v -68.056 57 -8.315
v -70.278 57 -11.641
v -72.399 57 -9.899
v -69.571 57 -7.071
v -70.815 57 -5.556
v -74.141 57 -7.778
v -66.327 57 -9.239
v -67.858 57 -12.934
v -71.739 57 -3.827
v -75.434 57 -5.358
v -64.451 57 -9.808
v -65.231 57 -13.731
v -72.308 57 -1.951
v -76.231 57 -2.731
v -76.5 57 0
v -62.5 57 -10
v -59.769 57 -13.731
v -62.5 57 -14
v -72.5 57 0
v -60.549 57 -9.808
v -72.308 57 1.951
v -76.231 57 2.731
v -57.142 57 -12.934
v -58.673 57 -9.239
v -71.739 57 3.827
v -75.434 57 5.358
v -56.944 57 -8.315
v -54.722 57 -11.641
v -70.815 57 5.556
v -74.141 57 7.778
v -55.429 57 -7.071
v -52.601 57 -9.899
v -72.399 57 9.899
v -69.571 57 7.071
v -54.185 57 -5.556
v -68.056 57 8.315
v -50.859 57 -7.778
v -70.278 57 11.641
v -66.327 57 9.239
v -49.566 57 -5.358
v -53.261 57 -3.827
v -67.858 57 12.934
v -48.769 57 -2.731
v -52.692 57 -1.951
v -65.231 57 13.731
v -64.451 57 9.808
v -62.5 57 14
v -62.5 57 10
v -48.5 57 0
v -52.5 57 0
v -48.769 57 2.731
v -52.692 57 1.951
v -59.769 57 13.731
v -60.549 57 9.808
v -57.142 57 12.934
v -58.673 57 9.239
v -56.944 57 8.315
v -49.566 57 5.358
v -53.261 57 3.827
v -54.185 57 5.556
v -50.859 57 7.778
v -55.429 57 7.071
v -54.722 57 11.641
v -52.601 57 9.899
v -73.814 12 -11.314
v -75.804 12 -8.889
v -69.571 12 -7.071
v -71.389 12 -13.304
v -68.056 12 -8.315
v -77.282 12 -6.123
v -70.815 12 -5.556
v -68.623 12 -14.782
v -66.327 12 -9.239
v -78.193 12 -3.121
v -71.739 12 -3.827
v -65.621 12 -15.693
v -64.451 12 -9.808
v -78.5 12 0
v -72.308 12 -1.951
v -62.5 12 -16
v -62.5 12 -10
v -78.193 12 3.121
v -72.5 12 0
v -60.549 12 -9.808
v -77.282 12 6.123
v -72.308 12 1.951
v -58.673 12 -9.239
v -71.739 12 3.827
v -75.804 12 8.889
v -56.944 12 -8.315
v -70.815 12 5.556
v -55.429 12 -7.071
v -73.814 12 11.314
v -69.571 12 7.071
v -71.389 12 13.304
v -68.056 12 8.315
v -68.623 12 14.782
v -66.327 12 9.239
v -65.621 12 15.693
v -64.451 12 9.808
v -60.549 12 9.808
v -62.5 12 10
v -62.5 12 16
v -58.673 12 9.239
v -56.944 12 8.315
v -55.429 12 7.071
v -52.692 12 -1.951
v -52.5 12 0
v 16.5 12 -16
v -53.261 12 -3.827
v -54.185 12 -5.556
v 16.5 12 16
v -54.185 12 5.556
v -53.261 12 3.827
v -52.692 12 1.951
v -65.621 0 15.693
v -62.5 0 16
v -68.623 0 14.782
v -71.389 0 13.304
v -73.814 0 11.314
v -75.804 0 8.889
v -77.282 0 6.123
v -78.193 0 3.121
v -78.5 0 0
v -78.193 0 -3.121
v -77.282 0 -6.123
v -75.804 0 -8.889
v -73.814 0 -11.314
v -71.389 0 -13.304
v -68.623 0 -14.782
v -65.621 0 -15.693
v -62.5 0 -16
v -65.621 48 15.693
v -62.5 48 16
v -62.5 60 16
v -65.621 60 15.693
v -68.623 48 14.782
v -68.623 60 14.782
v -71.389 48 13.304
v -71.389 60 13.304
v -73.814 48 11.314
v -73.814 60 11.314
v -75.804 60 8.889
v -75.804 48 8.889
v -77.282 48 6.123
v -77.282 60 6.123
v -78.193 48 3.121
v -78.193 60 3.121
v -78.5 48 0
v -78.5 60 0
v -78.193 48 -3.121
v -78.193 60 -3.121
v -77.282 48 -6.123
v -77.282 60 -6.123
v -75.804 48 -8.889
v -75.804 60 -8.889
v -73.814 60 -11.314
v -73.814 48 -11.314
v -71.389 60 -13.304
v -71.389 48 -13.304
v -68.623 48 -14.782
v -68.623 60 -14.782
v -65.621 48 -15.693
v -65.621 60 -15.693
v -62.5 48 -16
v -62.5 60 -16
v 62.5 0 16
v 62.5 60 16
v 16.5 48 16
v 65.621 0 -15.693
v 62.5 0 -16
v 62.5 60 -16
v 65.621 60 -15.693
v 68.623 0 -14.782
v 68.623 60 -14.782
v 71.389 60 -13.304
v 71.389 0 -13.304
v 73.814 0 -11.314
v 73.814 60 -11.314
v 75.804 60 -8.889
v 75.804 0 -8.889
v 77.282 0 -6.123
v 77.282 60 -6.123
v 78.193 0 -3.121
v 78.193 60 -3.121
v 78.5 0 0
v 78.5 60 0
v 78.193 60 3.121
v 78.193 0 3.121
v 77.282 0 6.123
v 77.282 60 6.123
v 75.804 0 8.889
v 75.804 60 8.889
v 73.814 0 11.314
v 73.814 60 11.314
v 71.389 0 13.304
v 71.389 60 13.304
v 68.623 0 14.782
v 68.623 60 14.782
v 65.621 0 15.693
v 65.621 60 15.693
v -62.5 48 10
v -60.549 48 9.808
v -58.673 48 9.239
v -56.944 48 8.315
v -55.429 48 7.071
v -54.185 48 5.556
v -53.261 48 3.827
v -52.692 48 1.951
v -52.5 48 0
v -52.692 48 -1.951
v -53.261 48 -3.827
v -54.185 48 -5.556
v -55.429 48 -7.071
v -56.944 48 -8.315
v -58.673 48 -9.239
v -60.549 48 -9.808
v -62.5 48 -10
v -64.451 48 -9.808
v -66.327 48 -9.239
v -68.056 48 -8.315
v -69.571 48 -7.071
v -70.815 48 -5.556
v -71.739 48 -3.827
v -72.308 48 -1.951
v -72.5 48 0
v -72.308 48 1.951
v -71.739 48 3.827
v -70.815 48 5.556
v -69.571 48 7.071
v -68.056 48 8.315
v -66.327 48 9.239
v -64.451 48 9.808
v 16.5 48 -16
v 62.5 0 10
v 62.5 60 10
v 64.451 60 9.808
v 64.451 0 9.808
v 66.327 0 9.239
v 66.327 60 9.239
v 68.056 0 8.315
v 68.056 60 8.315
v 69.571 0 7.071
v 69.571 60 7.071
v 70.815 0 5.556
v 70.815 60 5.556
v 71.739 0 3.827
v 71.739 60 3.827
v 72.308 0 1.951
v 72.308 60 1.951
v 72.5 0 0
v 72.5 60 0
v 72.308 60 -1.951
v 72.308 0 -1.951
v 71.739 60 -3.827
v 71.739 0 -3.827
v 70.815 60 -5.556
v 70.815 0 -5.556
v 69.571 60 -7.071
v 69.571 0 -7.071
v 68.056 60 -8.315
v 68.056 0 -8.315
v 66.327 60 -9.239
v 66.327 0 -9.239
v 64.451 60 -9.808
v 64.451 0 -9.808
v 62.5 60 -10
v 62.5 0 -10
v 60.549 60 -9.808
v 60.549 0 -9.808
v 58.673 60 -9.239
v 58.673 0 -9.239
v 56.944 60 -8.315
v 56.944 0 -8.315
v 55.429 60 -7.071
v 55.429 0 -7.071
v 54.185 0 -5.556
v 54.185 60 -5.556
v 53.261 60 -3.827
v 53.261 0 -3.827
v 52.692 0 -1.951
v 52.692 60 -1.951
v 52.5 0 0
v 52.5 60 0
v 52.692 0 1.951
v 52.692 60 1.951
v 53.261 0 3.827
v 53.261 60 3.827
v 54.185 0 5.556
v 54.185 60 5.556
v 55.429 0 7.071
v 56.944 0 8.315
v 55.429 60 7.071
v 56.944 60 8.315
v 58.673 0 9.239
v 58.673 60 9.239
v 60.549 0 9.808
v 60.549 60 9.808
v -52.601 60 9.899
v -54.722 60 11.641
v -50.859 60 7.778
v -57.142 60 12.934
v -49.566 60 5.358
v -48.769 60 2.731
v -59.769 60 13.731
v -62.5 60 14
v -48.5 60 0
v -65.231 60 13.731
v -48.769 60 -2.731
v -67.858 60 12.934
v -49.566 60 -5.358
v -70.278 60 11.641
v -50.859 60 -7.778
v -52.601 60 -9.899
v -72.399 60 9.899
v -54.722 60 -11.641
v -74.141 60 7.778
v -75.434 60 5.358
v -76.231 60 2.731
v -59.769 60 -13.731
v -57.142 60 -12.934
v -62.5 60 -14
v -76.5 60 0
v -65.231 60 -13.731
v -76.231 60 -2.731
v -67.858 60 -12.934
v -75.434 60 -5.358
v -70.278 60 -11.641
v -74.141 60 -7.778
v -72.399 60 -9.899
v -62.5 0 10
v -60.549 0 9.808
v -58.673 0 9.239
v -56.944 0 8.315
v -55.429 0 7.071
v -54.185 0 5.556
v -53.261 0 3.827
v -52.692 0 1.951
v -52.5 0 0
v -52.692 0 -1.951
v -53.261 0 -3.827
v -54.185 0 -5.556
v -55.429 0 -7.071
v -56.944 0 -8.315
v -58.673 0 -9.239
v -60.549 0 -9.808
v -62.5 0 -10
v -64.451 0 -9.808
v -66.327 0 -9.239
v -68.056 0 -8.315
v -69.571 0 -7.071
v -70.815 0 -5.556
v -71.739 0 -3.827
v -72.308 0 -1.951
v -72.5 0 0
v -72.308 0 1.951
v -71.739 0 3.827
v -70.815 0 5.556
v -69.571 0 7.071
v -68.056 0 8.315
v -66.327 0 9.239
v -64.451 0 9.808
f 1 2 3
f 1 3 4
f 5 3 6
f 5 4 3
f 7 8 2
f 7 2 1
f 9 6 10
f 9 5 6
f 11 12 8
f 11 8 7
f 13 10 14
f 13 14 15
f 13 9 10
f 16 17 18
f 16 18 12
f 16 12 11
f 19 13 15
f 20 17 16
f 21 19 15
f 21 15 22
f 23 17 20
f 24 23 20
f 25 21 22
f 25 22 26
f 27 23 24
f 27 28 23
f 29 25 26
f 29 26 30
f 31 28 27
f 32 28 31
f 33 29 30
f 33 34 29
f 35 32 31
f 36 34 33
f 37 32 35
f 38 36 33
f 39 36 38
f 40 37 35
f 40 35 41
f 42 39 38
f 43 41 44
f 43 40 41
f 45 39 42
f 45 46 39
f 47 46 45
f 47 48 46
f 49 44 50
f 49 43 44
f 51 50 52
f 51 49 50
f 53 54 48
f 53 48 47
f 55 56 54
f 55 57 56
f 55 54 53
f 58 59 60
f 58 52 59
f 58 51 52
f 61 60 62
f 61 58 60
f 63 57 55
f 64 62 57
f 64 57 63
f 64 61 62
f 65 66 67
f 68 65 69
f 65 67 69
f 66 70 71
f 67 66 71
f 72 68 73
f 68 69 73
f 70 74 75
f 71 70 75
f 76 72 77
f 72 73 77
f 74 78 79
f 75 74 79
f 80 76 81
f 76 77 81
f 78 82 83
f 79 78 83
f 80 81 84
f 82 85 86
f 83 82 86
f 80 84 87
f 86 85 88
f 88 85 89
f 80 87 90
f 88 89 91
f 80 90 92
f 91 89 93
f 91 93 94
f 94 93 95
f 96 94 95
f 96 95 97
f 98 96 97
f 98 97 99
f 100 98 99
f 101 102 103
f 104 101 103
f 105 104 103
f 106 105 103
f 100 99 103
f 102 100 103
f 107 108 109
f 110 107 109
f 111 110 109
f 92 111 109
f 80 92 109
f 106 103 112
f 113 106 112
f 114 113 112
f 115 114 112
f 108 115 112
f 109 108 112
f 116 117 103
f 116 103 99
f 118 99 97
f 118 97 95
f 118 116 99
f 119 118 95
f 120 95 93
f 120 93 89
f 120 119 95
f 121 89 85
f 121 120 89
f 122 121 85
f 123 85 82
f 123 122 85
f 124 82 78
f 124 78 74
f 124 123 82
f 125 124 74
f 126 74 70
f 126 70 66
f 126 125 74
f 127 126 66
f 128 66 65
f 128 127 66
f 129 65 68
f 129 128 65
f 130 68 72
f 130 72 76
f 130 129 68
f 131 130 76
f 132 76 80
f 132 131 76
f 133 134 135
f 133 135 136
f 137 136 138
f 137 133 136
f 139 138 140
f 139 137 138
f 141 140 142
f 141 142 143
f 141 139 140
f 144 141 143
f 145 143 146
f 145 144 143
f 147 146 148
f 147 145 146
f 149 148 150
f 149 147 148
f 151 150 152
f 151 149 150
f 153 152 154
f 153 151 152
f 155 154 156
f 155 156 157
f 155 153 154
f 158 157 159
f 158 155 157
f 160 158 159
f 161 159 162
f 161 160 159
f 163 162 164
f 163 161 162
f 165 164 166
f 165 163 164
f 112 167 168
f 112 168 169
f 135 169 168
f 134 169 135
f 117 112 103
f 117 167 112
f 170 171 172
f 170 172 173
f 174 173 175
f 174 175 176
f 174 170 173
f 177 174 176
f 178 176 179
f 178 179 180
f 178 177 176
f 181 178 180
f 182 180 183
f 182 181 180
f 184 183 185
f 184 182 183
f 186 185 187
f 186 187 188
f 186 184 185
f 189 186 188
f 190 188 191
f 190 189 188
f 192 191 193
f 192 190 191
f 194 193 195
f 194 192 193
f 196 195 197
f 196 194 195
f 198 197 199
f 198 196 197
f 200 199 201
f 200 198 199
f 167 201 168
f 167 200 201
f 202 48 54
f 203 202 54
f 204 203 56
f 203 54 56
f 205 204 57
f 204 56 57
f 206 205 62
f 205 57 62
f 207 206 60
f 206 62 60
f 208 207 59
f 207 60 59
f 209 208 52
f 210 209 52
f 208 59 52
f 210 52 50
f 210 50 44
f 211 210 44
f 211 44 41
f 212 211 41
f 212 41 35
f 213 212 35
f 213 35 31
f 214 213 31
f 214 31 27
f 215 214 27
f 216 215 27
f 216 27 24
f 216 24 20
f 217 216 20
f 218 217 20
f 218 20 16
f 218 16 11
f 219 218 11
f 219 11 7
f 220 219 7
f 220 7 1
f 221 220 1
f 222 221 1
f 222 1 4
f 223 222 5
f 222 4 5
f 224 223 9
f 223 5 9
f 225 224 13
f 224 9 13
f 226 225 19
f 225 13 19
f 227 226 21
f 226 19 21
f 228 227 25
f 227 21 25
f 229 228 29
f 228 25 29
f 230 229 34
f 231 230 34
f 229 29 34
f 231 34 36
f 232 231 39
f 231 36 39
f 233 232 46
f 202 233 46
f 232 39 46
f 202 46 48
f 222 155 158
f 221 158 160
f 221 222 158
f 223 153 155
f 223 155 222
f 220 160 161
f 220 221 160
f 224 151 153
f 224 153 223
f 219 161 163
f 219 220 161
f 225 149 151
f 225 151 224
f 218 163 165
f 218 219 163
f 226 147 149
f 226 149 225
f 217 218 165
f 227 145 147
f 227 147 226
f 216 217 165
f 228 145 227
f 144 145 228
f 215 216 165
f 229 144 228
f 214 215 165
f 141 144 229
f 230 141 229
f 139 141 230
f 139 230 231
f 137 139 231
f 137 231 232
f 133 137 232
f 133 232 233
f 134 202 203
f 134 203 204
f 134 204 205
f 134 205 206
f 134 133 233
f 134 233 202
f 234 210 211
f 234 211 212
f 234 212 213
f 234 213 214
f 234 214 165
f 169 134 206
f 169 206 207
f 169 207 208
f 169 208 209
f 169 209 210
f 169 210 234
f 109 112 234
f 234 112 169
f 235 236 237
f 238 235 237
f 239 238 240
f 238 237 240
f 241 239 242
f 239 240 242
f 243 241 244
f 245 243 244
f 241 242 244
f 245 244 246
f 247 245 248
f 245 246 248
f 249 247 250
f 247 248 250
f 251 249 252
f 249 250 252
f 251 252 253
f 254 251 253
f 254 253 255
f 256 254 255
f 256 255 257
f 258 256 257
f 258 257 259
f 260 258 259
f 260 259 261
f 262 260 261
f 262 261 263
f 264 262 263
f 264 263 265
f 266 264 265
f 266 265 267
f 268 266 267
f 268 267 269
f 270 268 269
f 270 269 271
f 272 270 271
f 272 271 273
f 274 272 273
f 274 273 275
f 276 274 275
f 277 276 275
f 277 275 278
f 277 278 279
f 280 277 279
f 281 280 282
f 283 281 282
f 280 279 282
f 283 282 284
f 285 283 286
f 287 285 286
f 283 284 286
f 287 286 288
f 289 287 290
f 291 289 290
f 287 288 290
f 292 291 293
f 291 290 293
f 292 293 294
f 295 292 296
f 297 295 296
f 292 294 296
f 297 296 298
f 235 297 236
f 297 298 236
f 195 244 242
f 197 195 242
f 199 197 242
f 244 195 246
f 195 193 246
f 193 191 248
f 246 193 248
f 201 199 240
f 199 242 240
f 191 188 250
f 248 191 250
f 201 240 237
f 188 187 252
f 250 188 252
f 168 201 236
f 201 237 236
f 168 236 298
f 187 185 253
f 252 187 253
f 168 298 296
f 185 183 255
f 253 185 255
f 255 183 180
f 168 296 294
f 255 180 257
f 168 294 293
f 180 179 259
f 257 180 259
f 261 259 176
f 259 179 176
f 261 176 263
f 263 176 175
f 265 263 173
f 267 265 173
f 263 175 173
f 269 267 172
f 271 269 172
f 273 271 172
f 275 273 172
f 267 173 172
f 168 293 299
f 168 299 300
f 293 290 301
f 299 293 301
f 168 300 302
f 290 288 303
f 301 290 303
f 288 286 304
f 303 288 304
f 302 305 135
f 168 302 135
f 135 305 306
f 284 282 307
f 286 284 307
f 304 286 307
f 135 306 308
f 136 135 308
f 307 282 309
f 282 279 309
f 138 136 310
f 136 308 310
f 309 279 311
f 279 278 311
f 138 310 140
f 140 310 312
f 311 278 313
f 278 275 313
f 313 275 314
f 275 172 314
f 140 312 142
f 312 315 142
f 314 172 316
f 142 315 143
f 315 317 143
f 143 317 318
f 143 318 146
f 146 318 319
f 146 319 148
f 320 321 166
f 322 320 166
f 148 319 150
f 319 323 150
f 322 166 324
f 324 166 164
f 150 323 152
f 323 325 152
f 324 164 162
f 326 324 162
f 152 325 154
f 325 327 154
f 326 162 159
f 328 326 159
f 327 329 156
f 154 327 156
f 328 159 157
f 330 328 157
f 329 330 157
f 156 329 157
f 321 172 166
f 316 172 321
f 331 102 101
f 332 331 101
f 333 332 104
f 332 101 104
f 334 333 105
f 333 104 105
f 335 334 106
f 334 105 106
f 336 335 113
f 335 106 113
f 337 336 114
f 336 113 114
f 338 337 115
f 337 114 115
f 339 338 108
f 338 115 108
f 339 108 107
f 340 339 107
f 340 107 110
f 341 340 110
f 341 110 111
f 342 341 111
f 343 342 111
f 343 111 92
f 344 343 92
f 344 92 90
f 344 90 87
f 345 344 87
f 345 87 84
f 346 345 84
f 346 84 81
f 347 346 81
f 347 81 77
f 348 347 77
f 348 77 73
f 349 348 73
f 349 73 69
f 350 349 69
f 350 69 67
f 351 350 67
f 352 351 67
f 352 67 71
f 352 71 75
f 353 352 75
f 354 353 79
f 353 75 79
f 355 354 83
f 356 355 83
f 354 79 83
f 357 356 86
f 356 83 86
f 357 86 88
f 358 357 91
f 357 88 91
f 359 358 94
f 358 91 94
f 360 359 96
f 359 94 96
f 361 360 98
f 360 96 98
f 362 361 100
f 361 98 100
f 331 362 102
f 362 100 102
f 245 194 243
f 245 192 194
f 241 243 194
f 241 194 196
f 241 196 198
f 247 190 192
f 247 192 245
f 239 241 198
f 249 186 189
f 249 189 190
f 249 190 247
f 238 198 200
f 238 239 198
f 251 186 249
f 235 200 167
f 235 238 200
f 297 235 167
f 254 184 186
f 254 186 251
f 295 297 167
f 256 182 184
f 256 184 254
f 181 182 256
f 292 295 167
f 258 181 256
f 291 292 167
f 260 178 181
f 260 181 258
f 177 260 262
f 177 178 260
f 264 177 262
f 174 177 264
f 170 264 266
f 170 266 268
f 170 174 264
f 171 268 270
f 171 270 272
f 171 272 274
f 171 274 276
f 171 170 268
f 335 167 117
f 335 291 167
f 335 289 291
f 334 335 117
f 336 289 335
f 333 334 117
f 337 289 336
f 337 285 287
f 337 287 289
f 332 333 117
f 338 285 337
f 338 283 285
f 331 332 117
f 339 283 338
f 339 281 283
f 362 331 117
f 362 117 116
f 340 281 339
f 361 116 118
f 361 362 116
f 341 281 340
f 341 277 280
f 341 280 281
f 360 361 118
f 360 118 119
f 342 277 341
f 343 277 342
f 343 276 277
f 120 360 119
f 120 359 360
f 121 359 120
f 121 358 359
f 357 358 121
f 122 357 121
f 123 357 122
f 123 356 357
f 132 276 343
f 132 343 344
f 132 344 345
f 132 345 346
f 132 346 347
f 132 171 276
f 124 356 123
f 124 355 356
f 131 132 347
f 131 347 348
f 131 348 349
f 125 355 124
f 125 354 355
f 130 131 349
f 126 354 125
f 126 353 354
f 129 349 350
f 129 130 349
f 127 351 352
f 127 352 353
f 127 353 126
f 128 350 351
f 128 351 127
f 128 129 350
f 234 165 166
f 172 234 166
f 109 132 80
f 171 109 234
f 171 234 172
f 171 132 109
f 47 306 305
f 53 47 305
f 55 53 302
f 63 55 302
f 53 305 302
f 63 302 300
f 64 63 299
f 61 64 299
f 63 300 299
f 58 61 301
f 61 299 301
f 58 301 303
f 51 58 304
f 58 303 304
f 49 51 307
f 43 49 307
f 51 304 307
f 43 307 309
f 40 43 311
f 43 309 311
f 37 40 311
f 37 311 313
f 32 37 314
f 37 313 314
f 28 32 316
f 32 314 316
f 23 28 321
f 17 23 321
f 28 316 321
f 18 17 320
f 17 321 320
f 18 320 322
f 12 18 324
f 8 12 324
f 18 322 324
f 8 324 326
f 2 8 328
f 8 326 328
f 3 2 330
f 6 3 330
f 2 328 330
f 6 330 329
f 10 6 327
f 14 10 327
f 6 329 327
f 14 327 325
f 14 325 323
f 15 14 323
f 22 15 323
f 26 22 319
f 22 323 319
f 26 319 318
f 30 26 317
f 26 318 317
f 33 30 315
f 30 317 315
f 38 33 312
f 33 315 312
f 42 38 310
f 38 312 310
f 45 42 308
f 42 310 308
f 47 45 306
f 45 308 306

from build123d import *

# Parameters (mm, degrees)
EXTRUDE_1_DEPTH     = 60
CUT_EXTRUDE_1_REACH = 102.091
SKETCH_2_R          = 10
CUT_EXTRUDE_2_REACH = 102.091
SKETCH_3_R          = 10
SKETCH_4_R          = 14
CUT_EXTRUDE_3_DEPTH = 3
CUT_EXTRUDE_4_REACH = 105.857
SKETCH_6_W          = 115
SKETCH_6_H          = 36


with BuildPart() as part:
    # 草图1 → 凸台-拉伸1 (new body)
    with BuildSketch(Plane(origin=(0, 0, 0), x_dir=(1, 0, 0), z_dir=(0, 1, 0))):
        with BuildLine():
            Line((-62.5, 16), (62.5, 16))
            ThreePointArc((62.5, 16), (78.5, 0), (62.5, -16))
            Line((62.5, -16), (-62.5, -16))
            ThreePointArc((-62.5, -16), (-78.5, 0), (-62.5, 16))
        make_face()
    extrude(amount=EXTRUDE_1_DEPTH)

    # 草图2 → 切除-拉伸1 (cut, up to next)
    with BuildSketch(Plane(origin=(0, 60, 0), x_dir=(1, 0, 0), z_dir=(0, 1, 0)), mode=Mode.PRIVATE) as cut_extrude_1_sk1:
        with Locations((62.5, 0)):
            Circle(SKETCH_2_R)
    cut_extrude_1_tool1 = extrude(cut_extrude_1_sk1.sketch, amount=-CUT_EXTRUDE_1_REACH, mode=Mode.PRIVATE) & part.part
    add(cut_extrude_1_tool1.solids().sort_by_distance((62.5, 60, 0))[0], mode=Mode.SUBTRACT)

    # 草图3 → 切除-拉伸2 (cut, up to next)
    with BuildSketch(Plane(origin=(0, 60, 0), x_dir=(1, 0, 0), z_dir=(0, 1, 0)), mode=Mode.PRIVATE) as cut_extrude_2_sk1:
        with Locations((-62.5, 0)):
            Circle(SKETCH_3_R)
    cut_extrude_2_tool1 = extrude(cut_extrude_2_sk1.sketch, amount=-CUT_EXTRUDE_2_REACH, mode=Mode.PRIVATE) & part.part
    add(cut_extrude_2_tool1.solids().sort_by_distance((-62.5, 60, 0))[0], mode=Mode.SUBTRACT)

    # 草图4 → 切除-拉伸3 (cut)
    with BuildSketch(Plane(origin=(0, 60, 0), x_dir=(1, 0, 0), z_dir=(0, 1, 0))):
        with Locations((-62.5, 0)):
            Circle(SKETCH_4_R)
    extrude(amount=-CUT_EXTRUDE_3_DEPTH, mode=Mode.SUBTRACT)

    # 草图6 → 切除-拉伸4 (cut, up to next)
    with BuildSketch(Plane.XY.offset(16), mode=Mode.PRIVATE) as cut_extrude_4_sk1:
        with Locations((-41, 30)):
            Rectangle(SKETCH_6_W, SKETCH_6_H)
    cut_extrude_4_tool1 = extrude(cut_extrude_4_sk1.sketch, amount=-CUT_EXTRUDE_4_REACH, mode=Mode.PRIVATE) & part.part
    add(cut_extrude_4_tool1.solids().sort_by_distance((-41, 30, 16))[0], mode=Mode.SUBTRACT)


solid = part.part
